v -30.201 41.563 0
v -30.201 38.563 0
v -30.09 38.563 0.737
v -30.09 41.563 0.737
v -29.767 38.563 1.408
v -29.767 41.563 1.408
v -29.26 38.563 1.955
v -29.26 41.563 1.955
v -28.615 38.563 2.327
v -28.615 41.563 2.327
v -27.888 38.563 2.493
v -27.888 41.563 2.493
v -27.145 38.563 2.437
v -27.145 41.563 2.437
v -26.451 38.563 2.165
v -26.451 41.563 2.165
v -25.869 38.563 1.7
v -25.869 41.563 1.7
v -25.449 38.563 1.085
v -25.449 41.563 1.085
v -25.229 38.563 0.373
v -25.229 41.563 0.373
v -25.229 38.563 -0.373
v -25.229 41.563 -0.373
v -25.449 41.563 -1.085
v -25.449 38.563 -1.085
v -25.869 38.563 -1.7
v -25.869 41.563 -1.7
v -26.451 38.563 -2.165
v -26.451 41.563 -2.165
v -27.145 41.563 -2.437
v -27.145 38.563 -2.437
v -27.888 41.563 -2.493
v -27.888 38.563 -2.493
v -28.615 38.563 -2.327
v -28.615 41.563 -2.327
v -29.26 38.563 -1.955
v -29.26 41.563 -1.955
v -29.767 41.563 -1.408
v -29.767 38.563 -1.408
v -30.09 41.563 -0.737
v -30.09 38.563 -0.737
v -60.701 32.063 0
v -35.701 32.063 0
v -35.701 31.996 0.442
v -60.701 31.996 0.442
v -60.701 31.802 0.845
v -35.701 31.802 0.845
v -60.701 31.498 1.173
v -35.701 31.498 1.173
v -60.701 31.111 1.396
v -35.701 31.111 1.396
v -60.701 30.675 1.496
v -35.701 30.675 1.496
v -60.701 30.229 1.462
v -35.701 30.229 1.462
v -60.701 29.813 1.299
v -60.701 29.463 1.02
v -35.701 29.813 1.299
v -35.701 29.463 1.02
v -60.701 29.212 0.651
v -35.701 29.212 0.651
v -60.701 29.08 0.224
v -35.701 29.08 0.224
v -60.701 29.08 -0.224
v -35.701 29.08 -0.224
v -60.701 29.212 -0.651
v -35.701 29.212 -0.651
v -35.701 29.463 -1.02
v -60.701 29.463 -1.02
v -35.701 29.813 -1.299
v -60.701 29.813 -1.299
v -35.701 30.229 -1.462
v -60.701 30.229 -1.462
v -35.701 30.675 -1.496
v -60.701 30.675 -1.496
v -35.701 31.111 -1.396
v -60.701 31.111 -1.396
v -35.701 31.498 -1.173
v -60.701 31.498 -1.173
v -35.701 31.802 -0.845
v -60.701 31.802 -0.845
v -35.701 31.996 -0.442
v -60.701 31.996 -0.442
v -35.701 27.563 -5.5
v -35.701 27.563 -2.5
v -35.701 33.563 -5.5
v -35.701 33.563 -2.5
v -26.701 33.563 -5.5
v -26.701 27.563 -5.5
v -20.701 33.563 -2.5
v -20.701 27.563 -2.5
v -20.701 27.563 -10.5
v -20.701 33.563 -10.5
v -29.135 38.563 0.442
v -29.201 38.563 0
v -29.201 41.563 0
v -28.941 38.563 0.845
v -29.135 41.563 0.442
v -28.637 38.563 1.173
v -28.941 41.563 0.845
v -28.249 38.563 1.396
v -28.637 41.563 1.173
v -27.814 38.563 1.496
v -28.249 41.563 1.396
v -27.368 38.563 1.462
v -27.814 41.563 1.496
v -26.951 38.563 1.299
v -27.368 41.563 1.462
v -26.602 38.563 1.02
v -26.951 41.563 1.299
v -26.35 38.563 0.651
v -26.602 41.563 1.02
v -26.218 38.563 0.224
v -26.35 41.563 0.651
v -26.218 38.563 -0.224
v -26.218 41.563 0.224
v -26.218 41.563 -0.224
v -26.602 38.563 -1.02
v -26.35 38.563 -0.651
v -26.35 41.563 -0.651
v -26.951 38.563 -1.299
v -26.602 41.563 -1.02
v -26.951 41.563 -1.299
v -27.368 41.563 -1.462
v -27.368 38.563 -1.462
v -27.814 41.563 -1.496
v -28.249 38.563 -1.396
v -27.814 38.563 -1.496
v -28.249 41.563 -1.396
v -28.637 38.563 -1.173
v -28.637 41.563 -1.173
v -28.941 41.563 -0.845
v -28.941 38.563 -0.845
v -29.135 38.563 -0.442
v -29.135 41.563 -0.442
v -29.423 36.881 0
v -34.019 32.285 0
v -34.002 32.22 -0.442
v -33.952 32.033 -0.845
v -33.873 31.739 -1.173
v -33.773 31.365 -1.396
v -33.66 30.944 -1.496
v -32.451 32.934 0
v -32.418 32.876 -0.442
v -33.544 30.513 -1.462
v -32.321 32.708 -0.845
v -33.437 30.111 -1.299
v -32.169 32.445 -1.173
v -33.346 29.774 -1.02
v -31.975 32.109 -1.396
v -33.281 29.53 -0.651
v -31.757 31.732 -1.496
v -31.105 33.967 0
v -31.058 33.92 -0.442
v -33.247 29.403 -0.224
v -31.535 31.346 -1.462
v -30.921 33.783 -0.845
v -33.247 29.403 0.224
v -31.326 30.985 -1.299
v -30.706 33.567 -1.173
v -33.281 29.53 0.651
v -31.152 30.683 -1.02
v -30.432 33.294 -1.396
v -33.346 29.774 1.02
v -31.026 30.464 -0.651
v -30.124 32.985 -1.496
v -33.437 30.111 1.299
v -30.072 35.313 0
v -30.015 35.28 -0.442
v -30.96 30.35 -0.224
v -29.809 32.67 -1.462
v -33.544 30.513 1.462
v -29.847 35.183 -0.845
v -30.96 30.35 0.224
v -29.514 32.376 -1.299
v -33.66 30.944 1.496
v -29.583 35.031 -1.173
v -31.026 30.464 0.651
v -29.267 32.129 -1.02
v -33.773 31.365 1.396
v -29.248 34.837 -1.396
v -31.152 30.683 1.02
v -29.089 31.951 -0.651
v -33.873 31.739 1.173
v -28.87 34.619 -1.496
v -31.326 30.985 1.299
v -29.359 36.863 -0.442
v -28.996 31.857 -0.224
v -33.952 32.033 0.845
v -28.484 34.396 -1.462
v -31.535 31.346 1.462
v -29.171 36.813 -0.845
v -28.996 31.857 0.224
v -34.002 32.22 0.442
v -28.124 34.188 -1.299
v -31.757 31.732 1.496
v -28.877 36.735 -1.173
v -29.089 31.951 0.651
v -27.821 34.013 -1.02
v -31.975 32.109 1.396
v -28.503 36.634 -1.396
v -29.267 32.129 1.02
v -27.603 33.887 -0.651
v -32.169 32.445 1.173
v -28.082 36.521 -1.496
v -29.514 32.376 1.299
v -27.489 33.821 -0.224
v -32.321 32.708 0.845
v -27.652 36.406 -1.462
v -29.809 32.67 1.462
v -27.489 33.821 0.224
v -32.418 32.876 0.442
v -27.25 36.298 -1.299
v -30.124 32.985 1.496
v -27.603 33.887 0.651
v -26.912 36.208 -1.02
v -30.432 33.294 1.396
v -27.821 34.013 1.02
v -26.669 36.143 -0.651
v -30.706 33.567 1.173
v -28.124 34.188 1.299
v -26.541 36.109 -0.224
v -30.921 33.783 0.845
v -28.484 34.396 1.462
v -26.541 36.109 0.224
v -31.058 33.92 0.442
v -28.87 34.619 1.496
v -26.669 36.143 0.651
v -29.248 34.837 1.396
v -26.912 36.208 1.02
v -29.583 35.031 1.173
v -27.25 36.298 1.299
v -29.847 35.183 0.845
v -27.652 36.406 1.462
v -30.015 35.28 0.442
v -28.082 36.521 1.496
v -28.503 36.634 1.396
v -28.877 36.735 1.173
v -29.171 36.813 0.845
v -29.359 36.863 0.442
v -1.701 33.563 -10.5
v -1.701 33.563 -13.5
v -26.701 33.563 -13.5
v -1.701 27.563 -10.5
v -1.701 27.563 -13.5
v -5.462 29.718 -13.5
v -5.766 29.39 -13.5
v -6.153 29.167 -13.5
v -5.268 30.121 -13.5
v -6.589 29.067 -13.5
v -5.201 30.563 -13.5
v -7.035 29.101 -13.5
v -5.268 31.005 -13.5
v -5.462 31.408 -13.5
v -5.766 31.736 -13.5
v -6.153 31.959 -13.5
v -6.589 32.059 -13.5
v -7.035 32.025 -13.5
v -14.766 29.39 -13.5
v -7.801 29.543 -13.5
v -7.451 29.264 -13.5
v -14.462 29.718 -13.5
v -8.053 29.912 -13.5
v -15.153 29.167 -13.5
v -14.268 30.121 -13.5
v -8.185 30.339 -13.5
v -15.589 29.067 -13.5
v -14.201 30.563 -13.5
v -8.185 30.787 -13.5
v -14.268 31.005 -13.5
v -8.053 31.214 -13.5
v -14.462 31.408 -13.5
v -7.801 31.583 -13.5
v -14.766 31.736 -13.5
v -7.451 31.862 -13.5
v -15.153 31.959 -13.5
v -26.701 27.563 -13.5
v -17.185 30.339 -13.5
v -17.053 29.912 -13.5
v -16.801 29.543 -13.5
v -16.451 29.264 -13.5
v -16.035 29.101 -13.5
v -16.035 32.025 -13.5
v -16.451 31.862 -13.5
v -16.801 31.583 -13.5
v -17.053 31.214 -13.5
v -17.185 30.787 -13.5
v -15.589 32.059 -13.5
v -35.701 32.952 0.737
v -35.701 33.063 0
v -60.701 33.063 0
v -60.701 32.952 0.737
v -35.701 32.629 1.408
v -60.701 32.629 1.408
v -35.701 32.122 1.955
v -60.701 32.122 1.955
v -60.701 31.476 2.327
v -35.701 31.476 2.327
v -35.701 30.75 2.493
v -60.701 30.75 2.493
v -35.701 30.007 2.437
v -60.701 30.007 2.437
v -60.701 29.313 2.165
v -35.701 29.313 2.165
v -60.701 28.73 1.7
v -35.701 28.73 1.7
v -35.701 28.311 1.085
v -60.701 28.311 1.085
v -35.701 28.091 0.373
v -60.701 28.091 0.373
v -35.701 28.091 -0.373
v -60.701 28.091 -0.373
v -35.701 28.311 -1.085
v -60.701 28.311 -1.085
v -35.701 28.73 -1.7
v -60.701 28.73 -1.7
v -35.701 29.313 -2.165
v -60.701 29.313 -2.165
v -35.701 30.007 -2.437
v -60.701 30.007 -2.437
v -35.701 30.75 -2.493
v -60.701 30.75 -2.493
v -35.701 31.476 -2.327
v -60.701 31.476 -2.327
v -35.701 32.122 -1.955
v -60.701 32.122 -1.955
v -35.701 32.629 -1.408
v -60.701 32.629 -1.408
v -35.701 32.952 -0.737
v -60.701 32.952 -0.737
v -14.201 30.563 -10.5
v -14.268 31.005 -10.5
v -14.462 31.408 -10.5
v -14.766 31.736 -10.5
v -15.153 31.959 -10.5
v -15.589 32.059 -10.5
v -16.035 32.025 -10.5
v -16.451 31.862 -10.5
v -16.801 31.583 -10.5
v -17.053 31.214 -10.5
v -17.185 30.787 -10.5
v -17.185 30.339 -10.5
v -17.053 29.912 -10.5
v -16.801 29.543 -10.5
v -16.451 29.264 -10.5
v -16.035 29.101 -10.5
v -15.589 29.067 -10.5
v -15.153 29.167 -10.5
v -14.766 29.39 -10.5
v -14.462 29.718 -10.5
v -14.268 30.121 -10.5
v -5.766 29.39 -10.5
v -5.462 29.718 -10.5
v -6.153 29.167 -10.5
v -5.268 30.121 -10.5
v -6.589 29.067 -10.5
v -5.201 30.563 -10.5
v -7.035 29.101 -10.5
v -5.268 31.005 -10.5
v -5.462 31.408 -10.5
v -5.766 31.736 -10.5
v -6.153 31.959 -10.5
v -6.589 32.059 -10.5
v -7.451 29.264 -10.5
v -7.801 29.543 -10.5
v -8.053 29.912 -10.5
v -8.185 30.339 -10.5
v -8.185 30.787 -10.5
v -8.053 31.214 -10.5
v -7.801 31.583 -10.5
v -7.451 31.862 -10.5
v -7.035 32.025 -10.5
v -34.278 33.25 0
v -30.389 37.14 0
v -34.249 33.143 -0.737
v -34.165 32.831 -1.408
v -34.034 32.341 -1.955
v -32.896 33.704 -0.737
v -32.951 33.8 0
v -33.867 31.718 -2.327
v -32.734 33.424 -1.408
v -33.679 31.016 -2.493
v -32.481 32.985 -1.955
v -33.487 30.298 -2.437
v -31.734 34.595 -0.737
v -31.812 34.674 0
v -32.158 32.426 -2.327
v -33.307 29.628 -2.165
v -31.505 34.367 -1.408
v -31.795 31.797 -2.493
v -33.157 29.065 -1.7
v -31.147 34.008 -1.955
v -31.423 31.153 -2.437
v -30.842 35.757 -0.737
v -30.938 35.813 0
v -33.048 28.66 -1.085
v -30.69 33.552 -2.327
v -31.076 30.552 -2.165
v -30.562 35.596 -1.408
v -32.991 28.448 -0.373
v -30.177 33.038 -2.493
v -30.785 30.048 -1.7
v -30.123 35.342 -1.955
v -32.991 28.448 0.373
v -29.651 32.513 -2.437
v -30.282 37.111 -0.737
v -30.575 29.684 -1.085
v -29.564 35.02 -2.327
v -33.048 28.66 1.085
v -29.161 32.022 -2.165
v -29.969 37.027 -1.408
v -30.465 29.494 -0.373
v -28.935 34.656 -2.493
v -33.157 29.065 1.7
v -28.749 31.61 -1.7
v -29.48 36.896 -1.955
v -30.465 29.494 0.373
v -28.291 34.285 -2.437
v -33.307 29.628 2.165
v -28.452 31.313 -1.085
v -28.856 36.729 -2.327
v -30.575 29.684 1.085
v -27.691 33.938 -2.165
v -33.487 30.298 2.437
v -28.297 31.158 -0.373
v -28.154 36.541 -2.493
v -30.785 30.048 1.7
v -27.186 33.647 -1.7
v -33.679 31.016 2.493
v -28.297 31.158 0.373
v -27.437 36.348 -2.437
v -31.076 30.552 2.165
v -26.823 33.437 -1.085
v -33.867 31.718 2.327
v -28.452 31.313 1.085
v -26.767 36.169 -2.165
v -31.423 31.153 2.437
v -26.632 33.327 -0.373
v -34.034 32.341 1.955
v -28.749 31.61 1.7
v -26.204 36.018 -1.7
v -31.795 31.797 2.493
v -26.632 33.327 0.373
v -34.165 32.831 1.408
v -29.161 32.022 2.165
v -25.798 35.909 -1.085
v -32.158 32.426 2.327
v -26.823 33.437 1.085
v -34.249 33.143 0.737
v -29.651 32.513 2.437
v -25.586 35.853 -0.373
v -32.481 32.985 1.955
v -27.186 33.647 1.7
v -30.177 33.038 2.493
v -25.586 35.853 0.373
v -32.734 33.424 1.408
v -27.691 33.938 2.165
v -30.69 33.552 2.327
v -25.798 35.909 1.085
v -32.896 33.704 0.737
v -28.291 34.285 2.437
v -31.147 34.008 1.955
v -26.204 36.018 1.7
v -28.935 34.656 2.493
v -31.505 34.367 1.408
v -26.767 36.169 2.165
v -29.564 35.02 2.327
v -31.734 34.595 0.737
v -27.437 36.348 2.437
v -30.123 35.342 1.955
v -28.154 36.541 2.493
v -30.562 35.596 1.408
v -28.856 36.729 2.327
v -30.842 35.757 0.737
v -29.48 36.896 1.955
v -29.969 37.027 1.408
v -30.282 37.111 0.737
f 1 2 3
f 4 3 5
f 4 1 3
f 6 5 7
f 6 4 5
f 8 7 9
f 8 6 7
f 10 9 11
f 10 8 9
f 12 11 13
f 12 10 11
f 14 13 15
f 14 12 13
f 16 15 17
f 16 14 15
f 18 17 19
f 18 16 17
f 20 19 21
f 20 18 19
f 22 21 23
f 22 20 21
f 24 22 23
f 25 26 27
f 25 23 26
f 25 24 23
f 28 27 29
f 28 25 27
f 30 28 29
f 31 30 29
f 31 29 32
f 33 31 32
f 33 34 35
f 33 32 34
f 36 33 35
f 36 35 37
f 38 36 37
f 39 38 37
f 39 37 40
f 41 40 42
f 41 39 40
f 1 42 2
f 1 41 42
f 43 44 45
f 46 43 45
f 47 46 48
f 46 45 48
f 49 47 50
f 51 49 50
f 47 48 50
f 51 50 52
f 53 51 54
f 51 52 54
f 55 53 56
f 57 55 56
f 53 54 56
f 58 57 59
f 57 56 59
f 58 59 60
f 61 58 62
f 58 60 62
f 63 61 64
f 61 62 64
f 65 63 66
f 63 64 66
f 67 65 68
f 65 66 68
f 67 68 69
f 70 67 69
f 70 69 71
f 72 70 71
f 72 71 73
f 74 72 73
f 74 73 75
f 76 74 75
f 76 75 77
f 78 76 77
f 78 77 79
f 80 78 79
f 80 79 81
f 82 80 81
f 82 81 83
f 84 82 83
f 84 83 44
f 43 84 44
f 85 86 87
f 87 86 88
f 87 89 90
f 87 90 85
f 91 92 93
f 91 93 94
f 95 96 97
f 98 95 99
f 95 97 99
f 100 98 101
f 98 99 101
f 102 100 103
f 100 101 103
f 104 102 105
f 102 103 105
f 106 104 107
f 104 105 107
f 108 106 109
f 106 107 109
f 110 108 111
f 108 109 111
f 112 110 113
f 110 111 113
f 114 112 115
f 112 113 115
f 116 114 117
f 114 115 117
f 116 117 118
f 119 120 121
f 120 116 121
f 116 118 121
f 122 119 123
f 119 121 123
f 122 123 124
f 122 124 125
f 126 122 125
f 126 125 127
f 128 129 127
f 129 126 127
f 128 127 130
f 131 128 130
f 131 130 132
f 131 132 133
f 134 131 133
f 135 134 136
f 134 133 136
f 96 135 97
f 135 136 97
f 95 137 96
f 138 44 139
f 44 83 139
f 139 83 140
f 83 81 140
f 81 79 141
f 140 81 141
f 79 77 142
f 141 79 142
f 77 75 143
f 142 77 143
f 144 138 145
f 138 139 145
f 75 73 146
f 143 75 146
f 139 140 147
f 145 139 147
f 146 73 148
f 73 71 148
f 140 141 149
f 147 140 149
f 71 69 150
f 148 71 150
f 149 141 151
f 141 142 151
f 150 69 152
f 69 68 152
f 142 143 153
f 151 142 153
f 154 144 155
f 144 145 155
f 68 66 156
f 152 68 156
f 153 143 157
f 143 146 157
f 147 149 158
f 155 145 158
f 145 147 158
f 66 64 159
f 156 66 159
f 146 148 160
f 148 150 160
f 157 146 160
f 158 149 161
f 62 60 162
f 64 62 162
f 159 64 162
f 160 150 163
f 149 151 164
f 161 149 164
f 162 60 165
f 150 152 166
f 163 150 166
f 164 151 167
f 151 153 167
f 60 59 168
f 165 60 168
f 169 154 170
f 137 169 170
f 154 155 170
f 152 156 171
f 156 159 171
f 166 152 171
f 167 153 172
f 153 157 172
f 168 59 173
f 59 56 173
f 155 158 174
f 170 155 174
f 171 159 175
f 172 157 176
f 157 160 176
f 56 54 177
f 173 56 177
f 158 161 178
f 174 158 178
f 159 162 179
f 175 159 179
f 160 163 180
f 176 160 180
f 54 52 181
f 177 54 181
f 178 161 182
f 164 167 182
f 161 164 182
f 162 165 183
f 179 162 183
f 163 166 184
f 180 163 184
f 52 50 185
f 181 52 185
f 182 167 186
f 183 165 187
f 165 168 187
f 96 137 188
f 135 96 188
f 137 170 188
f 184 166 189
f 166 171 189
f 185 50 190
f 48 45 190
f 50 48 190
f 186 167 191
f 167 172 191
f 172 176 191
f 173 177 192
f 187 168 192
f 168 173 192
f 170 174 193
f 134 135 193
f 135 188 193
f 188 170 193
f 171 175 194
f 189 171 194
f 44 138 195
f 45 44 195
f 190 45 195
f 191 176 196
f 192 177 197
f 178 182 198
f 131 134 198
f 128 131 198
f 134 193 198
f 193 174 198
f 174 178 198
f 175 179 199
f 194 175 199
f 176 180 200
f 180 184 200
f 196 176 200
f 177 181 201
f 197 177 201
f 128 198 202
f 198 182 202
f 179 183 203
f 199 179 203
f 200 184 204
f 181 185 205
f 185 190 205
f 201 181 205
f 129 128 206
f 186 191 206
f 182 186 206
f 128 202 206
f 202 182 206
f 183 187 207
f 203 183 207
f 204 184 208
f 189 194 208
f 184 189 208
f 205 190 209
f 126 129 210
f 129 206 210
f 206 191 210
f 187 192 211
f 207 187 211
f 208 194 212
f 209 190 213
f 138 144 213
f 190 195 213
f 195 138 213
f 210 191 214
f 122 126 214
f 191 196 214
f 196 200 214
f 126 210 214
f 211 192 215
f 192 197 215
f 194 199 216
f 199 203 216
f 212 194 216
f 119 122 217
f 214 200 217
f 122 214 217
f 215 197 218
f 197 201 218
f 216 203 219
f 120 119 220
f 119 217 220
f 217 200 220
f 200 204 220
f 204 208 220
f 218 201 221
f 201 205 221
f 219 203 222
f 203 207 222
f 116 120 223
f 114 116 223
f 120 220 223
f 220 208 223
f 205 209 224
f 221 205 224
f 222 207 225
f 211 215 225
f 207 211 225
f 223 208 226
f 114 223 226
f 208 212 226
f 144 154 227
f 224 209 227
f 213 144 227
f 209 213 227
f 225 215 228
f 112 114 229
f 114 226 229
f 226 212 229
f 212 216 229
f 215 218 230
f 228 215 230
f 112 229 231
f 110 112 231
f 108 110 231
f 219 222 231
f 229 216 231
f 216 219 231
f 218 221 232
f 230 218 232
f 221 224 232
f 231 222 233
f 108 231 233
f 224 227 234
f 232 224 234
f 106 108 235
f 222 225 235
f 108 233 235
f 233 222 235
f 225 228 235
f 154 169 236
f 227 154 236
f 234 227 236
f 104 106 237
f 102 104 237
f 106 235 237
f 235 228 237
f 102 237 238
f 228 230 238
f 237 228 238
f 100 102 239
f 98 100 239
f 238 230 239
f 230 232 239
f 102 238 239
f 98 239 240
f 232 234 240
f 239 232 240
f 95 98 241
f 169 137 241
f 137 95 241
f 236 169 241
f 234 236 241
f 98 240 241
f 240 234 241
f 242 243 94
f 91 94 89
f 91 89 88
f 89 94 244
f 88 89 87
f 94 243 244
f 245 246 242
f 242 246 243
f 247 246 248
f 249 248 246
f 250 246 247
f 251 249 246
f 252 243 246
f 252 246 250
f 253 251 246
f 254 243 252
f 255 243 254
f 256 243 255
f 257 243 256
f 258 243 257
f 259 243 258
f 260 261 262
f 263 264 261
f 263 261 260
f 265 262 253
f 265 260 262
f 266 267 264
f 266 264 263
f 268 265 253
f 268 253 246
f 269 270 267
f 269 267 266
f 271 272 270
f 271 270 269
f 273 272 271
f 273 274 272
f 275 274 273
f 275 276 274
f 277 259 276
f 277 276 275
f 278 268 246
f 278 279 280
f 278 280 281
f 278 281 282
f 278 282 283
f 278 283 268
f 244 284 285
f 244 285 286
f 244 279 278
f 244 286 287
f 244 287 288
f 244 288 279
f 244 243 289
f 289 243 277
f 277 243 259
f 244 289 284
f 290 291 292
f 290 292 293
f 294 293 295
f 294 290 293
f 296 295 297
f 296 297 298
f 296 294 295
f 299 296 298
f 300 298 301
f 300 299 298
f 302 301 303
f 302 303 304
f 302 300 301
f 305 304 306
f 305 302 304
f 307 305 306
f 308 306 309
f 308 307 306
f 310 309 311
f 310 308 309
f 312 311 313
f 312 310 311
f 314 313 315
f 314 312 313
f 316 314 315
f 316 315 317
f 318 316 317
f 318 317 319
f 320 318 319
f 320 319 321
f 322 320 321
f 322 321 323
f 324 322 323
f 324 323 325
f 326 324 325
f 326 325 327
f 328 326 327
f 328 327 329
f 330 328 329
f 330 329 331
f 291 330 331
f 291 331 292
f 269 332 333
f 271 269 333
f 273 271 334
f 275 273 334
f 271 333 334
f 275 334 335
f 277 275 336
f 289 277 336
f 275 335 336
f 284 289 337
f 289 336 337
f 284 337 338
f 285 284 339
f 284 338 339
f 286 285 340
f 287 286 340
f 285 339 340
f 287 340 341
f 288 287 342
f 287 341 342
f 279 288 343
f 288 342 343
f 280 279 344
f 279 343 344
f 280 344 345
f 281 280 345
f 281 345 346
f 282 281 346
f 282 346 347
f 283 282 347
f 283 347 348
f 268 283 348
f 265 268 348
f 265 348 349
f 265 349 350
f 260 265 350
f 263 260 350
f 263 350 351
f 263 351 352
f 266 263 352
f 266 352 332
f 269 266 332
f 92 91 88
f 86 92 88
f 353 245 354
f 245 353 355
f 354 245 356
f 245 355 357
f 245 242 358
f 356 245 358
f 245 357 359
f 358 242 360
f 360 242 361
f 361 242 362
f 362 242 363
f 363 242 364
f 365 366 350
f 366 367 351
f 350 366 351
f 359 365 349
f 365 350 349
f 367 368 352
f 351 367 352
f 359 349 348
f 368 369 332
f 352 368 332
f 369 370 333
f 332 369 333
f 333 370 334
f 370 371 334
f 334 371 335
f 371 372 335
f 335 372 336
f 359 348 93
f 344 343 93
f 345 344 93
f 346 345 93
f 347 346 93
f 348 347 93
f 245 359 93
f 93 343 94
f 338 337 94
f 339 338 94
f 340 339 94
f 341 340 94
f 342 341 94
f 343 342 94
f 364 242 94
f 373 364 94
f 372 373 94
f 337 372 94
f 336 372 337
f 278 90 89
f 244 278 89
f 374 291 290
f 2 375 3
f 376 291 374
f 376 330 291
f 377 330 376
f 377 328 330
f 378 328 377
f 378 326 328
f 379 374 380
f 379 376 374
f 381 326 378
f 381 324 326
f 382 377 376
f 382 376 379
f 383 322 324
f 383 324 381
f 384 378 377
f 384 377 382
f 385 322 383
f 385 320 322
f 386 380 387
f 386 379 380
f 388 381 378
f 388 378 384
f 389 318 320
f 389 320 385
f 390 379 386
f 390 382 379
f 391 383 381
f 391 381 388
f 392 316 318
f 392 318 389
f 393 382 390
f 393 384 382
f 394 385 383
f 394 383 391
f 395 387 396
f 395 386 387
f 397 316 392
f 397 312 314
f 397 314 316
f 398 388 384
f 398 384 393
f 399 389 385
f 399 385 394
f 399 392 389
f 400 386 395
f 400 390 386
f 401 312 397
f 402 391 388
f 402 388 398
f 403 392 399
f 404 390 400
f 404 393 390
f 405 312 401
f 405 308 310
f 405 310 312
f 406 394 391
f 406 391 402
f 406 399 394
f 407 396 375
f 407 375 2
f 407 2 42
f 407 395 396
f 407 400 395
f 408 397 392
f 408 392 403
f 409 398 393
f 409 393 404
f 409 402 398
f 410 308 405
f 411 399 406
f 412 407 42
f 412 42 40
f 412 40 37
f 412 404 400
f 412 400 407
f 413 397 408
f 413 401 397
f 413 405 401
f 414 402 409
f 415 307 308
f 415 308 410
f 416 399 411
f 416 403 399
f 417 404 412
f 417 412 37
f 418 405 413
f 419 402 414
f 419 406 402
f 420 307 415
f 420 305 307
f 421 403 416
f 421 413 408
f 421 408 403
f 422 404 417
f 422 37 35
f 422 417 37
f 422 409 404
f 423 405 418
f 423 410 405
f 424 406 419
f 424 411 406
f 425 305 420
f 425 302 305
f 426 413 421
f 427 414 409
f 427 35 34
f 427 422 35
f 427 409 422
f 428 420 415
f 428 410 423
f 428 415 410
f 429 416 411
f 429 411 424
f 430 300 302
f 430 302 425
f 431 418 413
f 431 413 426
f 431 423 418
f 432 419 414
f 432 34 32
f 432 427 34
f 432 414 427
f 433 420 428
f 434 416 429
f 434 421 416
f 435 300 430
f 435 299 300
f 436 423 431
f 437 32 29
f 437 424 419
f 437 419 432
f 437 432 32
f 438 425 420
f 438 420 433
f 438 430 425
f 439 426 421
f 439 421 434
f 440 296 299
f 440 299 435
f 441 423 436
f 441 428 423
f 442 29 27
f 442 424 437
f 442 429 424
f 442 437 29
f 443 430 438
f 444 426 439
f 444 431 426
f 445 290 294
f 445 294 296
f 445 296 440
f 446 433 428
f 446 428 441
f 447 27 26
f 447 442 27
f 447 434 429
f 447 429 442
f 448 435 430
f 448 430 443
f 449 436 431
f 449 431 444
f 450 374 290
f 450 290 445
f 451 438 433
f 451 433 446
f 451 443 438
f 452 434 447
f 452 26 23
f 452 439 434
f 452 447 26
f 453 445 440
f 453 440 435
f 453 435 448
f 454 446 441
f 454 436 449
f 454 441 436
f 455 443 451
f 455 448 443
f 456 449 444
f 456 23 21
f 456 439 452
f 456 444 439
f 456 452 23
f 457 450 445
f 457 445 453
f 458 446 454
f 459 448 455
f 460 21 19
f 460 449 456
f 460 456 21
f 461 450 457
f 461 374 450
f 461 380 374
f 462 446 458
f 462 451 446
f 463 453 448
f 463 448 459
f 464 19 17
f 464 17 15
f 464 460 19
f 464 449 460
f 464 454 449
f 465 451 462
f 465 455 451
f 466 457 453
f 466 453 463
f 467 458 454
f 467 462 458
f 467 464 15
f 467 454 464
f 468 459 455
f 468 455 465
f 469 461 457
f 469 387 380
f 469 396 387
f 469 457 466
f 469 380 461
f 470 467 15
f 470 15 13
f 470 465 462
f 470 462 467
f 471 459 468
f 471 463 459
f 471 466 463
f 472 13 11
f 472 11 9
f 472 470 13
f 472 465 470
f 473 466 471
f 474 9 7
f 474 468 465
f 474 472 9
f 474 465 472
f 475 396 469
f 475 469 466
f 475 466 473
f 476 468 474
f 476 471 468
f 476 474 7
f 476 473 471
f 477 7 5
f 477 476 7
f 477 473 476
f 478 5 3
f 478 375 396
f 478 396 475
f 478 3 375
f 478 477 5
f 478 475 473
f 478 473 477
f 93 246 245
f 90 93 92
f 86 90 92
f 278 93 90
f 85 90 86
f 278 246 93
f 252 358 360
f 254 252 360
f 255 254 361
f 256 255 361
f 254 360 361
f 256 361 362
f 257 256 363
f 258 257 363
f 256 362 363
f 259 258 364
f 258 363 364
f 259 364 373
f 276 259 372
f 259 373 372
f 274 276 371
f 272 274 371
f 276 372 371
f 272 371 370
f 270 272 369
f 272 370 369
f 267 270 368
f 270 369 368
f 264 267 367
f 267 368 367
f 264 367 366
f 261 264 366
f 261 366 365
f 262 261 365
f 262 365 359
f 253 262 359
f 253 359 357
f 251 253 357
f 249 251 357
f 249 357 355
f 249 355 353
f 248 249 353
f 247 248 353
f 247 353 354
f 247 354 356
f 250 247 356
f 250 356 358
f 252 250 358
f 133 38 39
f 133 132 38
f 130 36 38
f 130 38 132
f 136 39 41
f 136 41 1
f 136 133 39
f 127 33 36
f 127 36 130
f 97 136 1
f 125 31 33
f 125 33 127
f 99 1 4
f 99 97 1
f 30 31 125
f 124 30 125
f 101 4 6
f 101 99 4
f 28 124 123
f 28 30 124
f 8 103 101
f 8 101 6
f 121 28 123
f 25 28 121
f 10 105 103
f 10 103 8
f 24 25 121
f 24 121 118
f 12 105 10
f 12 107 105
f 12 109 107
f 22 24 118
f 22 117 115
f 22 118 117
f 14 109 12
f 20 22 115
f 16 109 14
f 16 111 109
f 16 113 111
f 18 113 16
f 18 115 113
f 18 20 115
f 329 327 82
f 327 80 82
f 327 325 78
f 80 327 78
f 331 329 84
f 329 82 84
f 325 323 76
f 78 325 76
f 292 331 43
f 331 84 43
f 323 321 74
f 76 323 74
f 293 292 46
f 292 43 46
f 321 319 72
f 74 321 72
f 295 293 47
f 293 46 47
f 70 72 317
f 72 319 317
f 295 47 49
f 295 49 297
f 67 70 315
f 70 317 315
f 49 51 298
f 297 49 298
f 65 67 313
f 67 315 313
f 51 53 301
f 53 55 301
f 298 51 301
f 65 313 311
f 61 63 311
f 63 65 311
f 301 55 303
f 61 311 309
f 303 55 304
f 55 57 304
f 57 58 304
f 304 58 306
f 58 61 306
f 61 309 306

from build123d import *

# Parameters (mm, degrees)
SKETCH3_R           = 2.5
SKETCH3_R_2         = 1.5
SKETCH4_W           = 15
SKETCH4_H           = 6
BOSS_EXTRUDE1_DEPTH = 3
SKETCH5_W           = 6
SKETCH5_H           = 6
BOSS_EXTRUDE2_DEPTH = 11
SKETCH6_W           = 25
SKETCH6_H           = 6
BOSS_EXTRUDE3_DEPTH = 3
SKETCH7_R           = 1.5
CUT_EXTRUDE1_DEPTH  = 75.707087809


with BuildPart() as part:
    # Sweep1: sweep along a path in Sketch1
    with BuildLine(Plane.XY) as sweep1_path:
        Line((-60.701435552, 30.563020681), (-35.701435552, 30.563020681))
        ThreePointArc((-35.701435552, 30.563020681), (-30.044581303, 32.906166431), (-27.701435552, 38.563020681))
        Line((-27.701435552, 38.563020681), (-27.701435552, 41.563020681))
    # Sketch3 → Sweep1 (sweep)
    with BuildSketch(Plane(origin=(0, 41.563020681, 0), x_dir=(-1, 0, 0), z_dir=(0, 1, 0))):
        with Locations((27.701435552, 0)):
            Circle(SKETCH3_R)
        with Locations((27.701435552, 0)):
            Circle(SKETCH3_R_2, mode=Mode.SUBTRACT)
    sweep(path=sweep1_path.line)


with BuildPart() as body_2:
    # Sketch4 → Boss-Extrude1 (new body)
    with BuildSketch(Plane(origin=(0, 0, -2.5), x_dir=(-1, 0, 0), z_dir=(0, 0, -1))):
        with Locations((28.201435552, 30.563020681)):
            Rectangle(SKETCH4_W, SKETCH4_H)
    extrude(amount=BOSS_EXTRUDE1_DEPTH)

    # Sketch5 → Boss-Extrude2 (add)
    with BuildSketch(Plane.XY.offset(-2.5)):
        with Locations((-23.701435552, 30.563020681)):
            Rectangle(SKETCH5_W, SKETCH5_H)
    extrude(amount=-BOSS_EXTRUDE2_DEPTH)

    # Sketch6 → Boss-Extrude3 (add)
    with BuildSketch(Plane(origin=(0, 0, -13.5), x_dir=(-1, 0, 0), z_dir=(0, 0, -1))):
        with Locations((14.201435552, 30.563020681)):
            Rectangle(SKETCH6_W, SKETCH6_H)
    extrude(amount=-BOSS_EXTRUDE3_DEPTH)

    # Sketch7 → Cut-Extrude1 (cut, through all)
    with BuildSketch(Plane.XY.offset(-10.5)):
        with Locations((-15.701435552, 30.563020681)):
            Circle(SKETCH7_R)
        with Locations((-6.701435552, 30.563020681)):
            Circle(SKETCH7_R)
    extrude(amount=-CUT_EXTRUDE1_DEPTH, mode=Mode.SUBTRACT)


solid = Compound([part.part, body_2.part])
